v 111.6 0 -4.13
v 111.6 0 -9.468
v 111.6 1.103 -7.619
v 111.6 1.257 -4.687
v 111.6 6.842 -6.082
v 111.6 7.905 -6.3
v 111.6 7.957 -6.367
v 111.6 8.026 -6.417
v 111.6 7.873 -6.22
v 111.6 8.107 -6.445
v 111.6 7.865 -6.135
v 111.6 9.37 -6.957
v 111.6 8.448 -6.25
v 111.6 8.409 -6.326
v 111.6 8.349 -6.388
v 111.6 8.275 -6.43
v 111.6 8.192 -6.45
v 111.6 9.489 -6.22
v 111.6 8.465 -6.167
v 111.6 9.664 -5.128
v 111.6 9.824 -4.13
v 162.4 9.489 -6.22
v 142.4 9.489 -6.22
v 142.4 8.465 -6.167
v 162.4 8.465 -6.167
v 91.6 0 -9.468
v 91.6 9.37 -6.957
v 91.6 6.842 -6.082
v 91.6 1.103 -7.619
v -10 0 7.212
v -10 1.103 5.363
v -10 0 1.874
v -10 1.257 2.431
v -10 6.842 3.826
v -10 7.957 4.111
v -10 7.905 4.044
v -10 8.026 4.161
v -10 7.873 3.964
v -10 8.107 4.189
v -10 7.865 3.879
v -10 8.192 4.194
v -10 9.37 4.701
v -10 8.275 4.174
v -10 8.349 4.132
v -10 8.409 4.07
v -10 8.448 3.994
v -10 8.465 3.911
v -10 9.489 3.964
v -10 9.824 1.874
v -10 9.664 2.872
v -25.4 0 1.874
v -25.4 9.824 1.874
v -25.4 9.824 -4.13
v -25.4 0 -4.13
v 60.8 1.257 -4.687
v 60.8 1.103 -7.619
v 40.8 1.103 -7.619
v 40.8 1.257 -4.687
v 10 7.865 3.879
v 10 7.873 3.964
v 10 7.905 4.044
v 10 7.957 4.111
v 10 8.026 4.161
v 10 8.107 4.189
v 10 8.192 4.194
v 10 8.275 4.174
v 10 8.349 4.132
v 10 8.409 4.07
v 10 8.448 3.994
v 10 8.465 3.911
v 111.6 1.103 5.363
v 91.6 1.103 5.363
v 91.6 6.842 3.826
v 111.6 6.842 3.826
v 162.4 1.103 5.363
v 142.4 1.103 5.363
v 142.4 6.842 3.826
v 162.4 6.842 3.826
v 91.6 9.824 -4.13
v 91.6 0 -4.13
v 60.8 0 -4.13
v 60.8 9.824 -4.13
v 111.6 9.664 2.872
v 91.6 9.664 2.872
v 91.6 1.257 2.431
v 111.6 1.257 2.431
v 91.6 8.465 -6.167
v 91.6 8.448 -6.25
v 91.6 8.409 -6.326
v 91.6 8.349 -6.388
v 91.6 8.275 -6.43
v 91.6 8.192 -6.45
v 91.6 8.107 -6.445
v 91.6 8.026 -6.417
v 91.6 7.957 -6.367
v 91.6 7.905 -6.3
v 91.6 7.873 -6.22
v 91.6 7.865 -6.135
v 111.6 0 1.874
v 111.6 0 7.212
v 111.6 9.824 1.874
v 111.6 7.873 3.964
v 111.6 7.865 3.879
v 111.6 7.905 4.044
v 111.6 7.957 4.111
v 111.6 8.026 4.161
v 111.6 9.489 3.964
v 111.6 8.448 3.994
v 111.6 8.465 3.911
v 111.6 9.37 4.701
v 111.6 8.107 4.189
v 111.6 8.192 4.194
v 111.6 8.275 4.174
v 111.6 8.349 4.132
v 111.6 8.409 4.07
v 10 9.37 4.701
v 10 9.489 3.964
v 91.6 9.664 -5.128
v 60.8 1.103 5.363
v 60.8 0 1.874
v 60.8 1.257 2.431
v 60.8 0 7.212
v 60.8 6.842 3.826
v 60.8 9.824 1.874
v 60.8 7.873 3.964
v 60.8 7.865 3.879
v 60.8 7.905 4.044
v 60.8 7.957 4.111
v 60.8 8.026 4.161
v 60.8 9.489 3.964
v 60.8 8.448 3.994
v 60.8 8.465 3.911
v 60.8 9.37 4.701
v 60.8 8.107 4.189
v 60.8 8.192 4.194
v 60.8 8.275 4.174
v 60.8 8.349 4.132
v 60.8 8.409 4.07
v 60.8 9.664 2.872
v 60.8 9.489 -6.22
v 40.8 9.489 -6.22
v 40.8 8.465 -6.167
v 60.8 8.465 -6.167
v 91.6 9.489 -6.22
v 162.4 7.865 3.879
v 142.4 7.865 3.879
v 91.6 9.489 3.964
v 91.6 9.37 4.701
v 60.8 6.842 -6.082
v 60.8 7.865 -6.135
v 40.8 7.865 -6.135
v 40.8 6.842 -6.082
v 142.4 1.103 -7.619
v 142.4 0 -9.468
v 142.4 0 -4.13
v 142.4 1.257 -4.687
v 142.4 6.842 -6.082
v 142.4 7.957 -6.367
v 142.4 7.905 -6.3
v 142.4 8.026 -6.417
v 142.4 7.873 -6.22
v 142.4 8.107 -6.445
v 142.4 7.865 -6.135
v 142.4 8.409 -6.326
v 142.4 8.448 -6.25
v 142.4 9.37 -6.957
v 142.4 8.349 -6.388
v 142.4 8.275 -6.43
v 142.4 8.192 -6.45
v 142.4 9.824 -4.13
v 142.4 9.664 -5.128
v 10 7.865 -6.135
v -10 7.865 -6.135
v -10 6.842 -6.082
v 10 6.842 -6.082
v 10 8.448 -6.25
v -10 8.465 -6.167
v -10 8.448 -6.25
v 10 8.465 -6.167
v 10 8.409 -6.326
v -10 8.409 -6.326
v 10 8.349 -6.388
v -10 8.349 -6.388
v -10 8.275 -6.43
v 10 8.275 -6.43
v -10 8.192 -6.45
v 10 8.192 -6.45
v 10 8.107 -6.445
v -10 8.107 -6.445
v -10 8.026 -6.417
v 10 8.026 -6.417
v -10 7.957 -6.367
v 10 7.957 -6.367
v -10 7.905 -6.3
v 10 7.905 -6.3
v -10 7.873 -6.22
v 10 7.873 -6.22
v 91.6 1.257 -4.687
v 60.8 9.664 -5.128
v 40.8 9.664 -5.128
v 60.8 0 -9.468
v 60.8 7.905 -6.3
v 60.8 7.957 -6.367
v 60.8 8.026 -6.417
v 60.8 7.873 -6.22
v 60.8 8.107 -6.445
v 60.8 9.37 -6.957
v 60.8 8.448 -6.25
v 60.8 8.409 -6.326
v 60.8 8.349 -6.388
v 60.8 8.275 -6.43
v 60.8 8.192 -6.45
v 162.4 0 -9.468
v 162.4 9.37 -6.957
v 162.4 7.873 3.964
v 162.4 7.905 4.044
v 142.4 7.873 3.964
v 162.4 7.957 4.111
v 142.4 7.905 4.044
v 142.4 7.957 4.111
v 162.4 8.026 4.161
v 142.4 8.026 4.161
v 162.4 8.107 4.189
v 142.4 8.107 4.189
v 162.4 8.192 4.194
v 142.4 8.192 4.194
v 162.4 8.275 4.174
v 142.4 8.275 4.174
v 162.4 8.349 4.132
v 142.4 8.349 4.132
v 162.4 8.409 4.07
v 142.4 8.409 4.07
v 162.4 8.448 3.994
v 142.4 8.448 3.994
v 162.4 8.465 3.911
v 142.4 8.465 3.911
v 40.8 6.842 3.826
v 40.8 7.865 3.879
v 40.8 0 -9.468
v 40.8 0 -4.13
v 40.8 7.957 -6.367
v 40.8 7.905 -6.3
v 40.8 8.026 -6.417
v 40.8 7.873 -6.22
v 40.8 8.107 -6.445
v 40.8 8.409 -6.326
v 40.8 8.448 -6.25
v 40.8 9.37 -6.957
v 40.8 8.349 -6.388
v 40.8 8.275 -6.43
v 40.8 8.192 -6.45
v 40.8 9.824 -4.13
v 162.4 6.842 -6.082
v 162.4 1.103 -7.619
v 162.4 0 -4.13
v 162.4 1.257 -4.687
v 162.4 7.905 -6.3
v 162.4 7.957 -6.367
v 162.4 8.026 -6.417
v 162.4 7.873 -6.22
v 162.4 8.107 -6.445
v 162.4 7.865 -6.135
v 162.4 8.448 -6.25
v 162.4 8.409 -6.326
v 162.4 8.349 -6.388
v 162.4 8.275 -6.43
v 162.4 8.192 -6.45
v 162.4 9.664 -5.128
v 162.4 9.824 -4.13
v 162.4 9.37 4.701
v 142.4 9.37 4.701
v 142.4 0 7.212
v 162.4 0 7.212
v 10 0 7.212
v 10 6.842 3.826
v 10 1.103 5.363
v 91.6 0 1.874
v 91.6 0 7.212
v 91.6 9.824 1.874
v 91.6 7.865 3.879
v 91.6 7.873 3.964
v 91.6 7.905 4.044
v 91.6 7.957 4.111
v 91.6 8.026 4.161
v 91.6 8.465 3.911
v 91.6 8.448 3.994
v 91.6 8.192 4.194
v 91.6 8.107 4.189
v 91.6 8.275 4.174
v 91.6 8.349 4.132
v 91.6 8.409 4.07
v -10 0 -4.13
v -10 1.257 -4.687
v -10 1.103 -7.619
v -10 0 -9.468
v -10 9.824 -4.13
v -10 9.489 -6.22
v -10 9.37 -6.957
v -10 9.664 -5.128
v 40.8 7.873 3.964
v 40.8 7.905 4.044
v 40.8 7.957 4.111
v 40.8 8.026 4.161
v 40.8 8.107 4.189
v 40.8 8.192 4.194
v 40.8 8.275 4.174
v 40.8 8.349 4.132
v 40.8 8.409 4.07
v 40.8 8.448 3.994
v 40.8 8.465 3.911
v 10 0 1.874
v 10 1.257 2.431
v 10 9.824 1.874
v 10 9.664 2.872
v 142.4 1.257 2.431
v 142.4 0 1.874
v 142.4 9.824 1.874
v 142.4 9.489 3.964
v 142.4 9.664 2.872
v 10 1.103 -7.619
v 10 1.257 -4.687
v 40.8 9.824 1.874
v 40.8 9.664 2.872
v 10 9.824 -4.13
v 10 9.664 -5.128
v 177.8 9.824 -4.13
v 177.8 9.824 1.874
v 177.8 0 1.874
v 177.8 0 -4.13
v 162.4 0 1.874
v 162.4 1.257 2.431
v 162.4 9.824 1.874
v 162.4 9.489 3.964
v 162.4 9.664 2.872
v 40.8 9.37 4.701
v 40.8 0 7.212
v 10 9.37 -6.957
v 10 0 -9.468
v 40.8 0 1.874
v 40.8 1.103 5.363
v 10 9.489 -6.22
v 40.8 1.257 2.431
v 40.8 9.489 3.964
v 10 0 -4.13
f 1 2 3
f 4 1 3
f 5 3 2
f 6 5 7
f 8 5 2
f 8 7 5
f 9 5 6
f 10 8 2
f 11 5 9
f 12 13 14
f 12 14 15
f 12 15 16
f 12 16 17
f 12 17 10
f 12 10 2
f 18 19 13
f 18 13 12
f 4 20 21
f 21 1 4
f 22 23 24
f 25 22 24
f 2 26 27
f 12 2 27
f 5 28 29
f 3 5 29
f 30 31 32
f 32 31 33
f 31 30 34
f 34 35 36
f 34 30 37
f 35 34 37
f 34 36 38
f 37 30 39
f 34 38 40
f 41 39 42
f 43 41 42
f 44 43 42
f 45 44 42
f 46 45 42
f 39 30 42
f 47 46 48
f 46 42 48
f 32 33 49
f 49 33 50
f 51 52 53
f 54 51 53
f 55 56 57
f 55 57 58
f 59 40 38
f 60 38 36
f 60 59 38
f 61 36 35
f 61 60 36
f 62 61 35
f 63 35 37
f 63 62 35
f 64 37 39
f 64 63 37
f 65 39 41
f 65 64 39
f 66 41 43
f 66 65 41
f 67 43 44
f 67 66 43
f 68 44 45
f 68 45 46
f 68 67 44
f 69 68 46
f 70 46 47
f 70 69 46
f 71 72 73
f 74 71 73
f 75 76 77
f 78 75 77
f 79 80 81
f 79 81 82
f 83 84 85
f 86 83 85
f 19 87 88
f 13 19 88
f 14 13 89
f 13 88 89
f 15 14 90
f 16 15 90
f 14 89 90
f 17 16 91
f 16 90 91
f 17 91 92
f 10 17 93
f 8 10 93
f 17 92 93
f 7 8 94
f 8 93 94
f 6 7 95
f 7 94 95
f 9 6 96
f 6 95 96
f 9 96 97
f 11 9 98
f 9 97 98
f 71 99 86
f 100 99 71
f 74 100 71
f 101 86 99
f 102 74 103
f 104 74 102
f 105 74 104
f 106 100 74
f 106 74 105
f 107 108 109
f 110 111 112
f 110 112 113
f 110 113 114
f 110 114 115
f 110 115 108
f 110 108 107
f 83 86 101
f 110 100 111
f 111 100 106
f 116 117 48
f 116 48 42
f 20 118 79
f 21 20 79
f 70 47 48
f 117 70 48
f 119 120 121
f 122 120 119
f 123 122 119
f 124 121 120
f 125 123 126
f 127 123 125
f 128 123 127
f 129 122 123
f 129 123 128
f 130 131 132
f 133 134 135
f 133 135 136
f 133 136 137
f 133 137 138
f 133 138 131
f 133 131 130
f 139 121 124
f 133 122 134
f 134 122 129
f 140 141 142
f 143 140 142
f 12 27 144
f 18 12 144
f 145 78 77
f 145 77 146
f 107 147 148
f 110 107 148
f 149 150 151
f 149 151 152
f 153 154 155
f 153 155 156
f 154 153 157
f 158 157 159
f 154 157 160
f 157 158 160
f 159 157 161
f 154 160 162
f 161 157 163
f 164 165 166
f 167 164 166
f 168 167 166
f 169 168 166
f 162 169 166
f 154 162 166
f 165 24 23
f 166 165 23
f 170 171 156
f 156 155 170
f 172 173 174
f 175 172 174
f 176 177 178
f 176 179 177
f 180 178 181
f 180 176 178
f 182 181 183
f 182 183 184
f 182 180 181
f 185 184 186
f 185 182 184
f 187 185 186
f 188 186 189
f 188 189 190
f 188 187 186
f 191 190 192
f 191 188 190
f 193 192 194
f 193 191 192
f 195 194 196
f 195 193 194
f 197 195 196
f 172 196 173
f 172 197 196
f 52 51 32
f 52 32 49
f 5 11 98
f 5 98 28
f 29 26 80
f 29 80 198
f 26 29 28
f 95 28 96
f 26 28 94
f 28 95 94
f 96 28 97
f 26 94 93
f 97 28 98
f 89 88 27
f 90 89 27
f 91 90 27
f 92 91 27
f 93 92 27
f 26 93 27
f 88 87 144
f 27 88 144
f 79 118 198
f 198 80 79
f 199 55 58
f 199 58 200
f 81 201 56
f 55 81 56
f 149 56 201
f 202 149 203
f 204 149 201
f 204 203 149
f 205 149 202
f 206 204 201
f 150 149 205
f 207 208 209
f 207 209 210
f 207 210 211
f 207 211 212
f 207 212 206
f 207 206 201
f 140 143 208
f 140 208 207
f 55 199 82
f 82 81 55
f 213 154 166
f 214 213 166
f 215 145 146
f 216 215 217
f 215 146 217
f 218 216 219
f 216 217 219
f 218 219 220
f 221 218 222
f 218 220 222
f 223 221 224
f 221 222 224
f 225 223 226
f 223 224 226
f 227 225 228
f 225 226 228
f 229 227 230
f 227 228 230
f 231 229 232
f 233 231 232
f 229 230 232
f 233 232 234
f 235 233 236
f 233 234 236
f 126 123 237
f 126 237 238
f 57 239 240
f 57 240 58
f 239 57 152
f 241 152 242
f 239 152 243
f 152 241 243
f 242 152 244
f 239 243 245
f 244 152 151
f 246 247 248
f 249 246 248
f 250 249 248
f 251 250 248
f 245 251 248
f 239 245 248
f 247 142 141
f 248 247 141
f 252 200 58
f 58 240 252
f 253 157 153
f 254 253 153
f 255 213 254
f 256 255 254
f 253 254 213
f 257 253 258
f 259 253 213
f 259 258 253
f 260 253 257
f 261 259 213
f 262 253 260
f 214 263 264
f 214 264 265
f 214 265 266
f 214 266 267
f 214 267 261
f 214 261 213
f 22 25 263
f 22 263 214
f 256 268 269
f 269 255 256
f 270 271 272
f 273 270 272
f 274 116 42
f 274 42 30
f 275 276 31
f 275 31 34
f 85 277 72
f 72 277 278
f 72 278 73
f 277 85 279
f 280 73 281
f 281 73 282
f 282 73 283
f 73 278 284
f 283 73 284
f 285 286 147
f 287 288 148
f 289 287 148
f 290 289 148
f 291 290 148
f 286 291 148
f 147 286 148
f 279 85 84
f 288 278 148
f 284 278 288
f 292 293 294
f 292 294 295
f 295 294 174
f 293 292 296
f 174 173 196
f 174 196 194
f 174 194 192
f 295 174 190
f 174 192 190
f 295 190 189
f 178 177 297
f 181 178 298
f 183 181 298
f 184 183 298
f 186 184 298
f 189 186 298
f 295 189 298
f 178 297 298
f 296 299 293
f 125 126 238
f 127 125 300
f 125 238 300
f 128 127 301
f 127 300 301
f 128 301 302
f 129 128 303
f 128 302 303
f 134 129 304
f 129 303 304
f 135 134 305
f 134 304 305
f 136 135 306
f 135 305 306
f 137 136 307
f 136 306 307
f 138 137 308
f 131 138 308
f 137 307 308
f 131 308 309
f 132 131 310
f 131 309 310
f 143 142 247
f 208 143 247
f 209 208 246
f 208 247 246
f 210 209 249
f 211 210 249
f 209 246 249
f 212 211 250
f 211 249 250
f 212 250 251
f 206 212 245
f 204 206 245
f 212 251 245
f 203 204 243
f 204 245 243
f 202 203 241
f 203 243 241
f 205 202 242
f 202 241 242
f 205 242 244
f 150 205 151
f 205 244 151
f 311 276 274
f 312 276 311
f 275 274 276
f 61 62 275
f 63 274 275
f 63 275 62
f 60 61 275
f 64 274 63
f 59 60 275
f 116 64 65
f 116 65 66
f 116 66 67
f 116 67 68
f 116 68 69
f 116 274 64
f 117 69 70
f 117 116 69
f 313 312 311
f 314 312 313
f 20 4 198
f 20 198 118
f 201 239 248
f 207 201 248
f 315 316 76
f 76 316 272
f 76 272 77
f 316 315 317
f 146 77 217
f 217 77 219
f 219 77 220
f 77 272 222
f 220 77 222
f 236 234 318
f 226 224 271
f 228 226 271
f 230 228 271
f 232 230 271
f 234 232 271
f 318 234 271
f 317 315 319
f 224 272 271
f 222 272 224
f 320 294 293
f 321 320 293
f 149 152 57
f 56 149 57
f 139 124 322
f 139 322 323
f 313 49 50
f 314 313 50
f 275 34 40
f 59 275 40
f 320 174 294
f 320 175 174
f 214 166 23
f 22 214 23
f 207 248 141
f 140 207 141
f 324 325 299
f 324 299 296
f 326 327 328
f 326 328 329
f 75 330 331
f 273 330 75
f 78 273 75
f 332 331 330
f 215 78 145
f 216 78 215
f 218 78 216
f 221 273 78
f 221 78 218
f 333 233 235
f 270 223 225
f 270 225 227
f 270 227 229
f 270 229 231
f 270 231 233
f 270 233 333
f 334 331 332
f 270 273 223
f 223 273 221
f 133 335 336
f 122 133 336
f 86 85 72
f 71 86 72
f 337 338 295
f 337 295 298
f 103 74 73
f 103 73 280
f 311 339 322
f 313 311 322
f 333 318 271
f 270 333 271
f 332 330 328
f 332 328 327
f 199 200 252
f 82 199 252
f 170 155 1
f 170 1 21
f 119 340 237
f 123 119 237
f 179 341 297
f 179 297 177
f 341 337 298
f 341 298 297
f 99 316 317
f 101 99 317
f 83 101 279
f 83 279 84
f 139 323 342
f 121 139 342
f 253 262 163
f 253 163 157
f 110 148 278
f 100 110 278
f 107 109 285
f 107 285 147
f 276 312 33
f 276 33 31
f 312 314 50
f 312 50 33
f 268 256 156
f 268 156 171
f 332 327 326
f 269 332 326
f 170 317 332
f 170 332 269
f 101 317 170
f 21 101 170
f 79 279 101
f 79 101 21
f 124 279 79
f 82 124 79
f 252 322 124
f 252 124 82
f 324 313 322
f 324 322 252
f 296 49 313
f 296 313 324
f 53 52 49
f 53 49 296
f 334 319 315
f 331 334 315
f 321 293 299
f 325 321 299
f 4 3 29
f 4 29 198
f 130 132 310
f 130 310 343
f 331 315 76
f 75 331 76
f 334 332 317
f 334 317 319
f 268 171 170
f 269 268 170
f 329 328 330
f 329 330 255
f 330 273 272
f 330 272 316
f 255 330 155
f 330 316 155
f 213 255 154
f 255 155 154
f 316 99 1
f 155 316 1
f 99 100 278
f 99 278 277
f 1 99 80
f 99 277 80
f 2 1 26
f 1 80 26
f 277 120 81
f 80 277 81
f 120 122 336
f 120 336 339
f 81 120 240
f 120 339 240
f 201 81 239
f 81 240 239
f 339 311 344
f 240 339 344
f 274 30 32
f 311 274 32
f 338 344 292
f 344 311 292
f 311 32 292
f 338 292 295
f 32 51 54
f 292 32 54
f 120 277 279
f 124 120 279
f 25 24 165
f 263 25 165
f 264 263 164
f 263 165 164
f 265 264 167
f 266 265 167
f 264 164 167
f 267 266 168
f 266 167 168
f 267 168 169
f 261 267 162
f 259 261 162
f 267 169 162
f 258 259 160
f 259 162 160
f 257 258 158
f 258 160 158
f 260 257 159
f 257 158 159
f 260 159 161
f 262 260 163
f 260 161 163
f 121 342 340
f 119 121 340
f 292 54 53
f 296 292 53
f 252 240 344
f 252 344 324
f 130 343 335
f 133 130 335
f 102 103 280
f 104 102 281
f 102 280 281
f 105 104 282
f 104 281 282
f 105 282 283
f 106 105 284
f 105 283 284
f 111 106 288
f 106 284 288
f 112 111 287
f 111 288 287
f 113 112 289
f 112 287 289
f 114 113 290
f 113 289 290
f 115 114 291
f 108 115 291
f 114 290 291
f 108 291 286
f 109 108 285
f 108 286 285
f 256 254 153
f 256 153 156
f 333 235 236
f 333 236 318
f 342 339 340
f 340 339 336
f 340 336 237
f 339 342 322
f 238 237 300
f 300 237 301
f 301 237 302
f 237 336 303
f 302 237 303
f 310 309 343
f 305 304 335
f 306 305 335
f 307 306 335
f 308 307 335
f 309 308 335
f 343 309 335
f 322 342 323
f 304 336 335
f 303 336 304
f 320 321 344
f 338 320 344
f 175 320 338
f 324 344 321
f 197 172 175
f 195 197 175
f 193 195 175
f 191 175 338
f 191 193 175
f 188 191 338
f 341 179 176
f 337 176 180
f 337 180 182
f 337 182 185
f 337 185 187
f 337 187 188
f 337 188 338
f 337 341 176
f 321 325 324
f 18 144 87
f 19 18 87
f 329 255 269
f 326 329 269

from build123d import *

# Parameters (mm, degrees)
CLIP_1_DEPTH           = 10
CENTER_BEAM_DEPTH      = 177.8
CENTER_BEAM_DEPTH_BACK = 25.4
SKETCH4_W              = 6.003992509
SKETCH4_H              = 9.824299843
LPATTERN1_COUNT        = 4
LPATTERN1_PITCH        = 50.8


with BuildPart() as part:
    # Sketch1 → Clip #1 (new, symmetric)
    with BuildSketch(Plane(origin=(0, 0, 0), x_dir=(0, 0, -1), z_dir=(1, 0, 0))):
        with BuildLine():
            Line((6.081551938, 6.841542851), (7.61911384, 1.103283712))
            Line((7.61911384, 1.103283712), (4.687365208, 1.256930148))
            Line((4.687365208, 1.256930148), (5.127959845, 9.663976652))
            Line((5.127959845, 9.663976652), (4.1299561, 9.824299843))
            Line((4.1299561, 9.824299843), (-1.874036409, 9.824299843))
            Line((-1.874036409, 9.824299843), (-2.872040155, 9.663976652))
            Line((-2.872040155, 9.663976652), (-2.431445517, 1.256930148))
            Line((-2.431445517, 1.256930148), (-5.36319415, 1.103283712))
            Line((-5.36319415, 1.103283712), (-3.825632248, 6.841542851))
            Line((-3.825632248, 6.841542851), (-3.879292118, 7.86543416))
            ThreePointArc((-3.879292118, 7.86543416), (-4.194581765, 8.149322234), (-3.910693691, 8.464611881))
            Line((-3.910693691, 8.464611881), (-3.964353561, 9.488503191))
            Line((-3.964353561, 9.488503191), (-4.701004321, 9.370164756))
            Line((-4.701004321, 9.370164756), (-7.2117324, 0))
            Line((-7.2117324, 0), (-2.365572599, 0))
            Line((-2.365572599, 0), (4.62149229, 0))
            Line((4.62149229, 0), (9.46765209, 0))
            Line((9.46765209, 0), (6.956924011, 9.370164756))
            Line((6.956924011, 9.370164756), (6.220273251, 9.488503191))
            Line((6.220273251, 9.488503191), (6.166613382, 8.464611881))
            ThreePointArc((6.166613382, 8.464611881), (6.450501455, 8.149322234), (6.135211808, 7.86543416))
            Line((6.135211808, 7.86543416), (6.081551938, 6.841542851))
        make_face()
    clip_1 = extrude(amount=CLIP_1_DEPTH, both=True)

    # Sketch4 → Center beam (add, two sides: drawn at the far end of the back side and taken through both)
    with BuildSketch(Plane(origin=(0, 0, 0), x_dir=(0, 0, -1), z_dir=(1, 0, 0)).offset(-CENTER_BEAM_DEPTH_BACK)):
        with Locations((1.127959845, 4.912149922)):
            Rectangle(SKETCH4_W, SKETCH4_H)
    extrude(amount=CENTER_BEAM_DEPTH + CENTER_BEAM_DEPTH_BACK)

    # LPattern1: Clip #1 ×4
    with Locations(*[(i * LPATTERN1_PITCH, 0, 0) for i in range(1, LPATTERN1_COUNT)]):
        add(clip_1)


solid = part.part
